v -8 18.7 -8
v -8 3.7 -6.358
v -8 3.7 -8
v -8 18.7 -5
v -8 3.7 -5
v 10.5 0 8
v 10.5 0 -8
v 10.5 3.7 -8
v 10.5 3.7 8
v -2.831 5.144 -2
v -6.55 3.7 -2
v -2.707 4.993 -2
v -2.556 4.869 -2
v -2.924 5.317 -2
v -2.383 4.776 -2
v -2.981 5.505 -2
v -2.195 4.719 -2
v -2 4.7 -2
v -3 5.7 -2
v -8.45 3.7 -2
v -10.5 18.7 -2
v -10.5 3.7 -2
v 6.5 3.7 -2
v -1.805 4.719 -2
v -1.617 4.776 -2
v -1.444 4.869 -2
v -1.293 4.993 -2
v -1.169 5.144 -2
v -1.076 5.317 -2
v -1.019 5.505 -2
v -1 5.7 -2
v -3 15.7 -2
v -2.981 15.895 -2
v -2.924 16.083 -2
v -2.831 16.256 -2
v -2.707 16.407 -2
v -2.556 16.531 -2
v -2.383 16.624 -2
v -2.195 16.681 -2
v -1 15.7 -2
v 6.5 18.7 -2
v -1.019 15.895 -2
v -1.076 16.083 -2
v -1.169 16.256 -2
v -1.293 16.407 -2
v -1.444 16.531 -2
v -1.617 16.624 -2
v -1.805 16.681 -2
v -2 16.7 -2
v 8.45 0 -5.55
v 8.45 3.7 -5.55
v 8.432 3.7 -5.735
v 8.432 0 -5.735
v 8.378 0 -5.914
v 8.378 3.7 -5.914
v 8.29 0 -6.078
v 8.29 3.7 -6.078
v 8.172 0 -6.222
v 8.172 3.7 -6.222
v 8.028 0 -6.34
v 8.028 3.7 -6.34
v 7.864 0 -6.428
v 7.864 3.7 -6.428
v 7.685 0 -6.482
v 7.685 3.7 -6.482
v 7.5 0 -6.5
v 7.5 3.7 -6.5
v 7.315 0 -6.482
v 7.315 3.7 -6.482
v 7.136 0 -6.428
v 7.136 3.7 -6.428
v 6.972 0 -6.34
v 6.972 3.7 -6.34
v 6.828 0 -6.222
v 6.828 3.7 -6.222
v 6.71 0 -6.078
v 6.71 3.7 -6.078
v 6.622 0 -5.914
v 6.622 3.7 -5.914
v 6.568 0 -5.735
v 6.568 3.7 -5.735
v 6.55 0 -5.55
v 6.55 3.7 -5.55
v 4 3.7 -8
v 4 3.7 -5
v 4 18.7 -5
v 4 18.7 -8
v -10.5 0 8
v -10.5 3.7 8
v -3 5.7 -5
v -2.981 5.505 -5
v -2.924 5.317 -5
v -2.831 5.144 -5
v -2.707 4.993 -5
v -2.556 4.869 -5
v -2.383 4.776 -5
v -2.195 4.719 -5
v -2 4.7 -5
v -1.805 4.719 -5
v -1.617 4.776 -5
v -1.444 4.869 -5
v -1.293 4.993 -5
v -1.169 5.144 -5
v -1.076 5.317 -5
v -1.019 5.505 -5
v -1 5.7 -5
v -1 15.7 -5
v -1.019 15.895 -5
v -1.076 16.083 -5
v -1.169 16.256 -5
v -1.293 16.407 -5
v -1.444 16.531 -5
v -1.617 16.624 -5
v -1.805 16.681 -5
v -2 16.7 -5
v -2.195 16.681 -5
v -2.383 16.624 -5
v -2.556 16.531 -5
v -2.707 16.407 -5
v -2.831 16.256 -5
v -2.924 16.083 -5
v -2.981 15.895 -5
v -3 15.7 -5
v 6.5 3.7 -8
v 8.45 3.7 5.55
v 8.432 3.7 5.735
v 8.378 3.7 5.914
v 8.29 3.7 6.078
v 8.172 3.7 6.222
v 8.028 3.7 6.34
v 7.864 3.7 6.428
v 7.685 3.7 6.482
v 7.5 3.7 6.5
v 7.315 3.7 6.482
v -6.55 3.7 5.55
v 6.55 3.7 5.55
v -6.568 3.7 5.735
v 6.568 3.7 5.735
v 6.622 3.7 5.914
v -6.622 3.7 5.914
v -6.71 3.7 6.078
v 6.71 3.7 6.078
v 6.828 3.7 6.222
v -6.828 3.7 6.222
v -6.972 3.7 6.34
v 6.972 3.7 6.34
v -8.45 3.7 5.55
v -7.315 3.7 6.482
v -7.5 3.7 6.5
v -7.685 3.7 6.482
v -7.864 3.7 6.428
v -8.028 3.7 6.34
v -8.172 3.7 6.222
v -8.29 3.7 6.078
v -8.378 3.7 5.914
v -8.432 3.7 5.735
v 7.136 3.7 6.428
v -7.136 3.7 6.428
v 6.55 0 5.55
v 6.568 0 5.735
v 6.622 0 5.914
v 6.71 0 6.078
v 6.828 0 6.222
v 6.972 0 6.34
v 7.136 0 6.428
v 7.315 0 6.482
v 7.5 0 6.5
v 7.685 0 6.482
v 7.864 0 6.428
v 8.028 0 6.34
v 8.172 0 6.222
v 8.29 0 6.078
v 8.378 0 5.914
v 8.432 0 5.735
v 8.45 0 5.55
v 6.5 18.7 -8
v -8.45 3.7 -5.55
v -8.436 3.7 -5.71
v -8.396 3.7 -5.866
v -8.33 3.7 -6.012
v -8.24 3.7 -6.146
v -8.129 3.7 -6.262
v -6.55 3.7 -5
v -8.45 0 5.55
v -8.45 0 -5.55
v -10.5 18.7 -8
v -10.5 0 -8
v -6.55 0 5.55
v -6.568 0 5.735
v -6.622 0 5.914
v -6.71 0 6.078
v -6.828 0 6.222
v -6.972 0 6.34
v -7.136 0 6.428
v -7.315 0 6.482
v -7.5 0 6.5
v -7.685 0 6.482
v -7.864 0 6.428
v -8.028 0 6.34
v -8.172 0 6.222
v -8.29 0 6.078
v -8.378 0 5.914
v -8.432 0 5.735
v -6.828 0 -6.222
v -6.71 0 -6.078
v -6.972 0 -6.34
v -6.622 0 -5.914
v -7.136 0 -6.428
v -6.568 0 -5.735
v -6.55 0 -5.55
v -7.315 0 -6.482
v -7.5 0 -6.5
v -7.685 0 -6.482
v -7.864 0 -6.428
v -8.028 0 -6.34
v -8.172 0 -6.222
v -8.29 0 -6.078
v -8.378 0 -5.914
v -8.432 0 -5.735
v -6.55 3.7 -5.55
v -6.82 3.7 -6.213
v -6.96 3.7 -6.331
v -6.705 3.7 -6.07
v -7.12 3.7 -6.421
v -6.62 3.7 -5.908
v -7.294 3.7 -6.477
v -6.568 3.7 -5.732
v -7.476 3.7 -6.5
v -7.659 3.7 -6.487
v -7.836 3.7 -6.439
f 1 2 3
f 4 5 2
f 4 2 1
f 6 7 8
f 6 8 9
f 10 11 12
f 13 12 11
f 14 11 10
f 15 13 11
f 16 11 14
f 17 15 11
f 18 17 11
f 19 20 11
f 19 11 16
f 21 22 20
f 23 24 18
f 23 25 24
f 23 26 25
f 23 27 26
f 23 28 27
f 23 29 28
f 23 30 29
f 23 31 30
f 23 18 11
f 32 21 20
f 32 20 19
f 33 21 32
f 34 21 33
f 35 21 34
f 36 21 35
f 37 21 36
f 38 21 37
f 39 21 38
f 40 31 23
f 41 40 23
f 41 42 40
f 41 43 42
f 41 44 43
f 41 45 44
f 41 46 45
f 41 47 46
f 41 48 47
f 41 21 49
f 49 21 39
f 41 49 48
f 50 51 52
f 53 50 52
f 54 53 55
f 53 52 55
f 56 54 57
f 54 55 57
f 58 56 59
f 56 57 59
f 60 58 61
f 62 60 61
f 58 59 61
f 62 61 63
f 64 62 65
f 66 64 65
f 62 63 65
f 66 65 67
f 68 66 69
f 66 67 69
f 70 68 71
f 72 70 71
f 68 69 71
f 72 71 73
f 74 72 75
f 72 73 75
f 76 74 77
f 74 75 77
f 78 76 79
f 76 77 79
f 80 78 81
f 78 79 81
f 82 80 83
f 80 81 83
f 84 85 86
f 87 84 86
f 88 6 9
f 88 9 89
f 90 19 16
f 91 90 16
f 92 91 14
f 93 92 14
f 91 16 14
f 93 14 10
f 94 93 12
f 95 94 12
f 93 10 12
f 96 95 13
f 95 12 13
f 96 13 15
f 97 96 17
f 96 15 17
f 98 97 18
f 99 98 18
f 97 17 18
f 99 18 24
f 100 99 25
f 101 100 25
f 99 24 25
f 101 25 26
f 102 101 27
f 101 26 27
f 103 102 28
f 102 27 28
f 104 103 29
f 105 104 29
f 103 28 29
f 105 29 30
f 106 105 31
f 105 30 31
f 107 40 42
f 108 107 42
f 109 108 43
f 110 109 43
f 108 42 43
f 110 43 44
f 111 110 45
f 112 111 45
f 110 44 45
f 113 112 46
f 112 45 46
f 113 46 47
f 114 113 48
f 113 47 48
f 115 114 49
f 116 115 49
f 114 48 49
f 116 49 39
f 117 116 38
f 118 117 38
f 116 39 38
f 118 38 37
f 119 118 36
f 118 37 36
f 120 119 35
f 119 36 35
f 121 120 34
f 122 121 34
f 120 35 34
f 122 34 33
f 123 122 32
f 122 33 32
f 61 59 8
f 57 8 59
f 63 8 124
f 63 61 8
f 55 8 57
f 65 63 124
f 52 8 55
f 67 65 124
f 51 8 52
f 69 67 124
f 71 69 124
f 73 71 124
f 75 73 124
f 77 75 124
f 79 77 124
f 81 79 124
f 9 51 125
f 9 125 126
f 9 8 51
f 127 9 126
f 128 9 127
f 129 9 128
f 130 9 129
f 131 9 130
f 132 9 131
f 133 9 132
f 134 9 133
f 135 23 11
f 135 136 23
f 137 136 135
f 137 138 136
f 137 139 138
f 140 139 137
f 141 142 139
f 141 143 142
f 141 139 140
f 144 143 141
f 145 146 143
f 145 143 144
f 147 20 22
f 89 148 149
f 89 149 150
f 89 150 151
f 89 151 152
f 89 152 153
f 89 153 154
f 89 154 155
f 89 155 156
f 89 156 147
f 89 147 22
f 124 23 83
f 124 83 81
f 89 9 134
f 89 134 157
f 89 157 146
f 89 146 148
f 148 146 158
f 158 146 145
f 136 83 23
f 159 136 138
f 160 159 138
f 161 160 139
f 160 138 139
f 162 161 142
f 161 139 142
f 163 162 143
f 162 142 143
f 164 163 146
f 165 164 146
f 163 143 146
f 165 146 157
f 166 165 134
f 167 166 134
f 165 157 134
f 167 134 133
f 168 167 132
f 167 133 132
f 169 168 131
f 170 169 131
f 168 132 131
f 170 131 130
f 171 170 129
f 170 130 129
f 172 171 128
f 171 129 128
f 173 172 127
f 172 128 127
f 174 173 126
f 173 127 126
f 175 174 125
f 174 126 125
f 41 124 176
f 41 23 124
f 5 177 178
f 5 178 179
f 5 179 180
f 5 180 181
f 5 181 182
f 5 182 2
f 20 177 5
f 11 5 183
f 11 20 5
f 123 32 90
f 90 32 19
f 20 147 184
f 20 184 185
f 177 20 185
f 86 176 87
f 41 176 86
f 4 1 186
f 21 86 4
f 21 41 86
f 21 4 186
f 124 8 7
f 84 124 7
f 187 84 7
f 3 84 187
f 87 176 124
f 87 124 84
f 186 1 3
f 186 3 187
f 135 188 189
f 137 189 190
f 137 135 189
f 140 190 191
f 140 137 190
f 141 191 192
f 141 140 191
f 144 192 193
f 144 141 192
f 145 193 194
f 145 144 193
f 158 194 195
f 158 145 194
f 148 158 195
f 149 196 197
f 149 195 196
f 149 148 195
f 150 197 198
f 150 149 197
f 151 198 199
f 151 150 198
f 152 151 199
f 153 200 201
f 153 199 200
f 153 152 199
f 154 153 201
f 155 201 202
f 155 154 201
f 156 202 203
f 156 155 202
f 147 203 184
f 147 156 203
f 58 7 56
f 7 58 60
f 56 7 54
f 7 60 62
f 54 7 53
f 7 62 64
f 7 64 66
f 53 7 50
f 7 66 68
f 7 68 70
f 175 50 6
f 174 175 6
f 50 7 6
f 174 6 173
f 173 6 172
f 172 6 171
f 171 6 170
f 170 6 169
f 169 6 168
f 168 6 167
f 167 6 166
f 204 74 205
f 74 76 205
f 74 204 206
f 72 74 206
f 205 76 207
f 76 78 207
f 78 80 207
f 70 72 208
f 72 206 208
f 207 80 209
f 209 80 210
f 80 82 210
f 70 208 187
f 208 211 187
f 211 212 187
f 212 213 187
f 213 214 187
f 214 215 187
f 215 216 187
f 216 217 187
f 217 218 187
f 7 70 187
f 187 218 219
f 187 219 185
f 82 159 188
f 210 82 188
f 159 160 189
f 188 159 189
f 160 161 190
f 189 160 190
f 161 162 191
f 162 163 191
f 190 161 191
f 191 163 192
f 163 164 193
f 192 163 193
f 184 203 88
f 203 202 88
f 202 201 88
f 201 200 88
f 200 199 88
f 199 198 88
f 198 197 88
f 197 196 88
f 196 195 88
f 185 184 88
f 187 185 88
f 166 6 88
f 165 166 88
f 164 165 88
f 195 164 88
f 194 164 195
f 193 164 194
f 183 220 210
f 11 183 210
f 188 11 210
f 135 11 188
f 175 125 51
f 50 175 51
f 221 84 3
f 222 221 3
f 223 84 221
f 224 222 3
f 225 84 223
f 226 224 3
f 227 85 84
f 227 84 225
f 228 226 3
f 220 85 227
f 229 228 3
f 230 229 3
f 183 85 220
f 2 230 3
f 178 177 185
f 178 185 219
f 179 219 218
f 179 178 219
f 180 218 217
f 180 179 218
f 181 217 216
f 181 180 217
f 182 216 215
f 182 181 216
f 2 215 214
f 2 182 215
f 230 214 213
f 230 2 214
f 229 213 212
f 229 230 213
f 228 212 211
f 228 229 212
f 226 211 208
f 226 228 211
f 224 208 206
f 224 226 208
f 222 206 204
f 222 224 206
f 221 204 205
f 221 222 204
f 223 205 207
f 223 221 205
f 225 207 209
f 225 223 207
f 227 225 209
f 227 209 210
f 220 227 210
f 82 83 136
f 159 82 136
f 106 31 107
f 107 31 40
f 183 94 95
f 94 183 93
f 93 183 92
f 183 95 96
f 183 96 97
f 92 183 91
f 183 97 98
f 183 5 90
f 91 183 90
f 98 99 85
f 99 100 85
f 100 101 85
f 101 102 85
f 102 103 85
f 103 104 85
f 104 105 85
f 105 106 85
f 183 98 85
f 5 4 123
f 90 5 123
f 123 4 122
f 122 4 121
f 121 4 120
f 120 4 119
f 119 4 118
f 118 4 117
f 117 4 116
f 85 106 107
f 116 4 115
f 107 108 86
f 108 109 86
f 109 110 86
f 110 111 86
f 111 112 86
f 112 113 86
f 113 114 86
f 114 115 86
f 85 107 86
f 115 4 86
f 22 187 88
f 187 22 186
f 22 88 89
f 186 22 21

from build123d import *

# Parameters (mm, degrees)
SKETCH1_W           = 10
SKETCH1_H           = 16
BOSS_EXTRUDE1_DEPTH = 3.7
SKETCH5_W           = 5.5
SKETCH5_H           = 16
BOSS_EXTRUDE2_DEPTH = 3.7
CUT_EXTRUDE4_DEPTH  = 4.7
BOSS_EXTRUDE3_START = -2
SKETCH7_W           = 17
SKETCH7_H           = 15
BOSS_EXTRUDE3_DEPTH = 3
SKETCH8_W           = 2.5
SKETCH8_H           = 15
BOSS_EXTRUDE5_DEPTH = 3


with BuildPart() as part:
    # Sketch1 → Boss-Extrude1 (new body)
    with BuildSketch(Plane(origin=(0, 0, 0), x_dir=(1, 0, 0), z_dir=(0, 1, 0))):
        Rectangle(SKETCH1_W, SKETCH1_H)
    extrude(amount=BOSS_EXTRUDE1_DEPTH)

    # Sketch5 → Boss-Extrude2 (add)
    with BuildSketch(Plane.XZ):
        with Locations((-7.75, 0)):
            Rectangle(SKETCH5_W, SKETCH5_H)
    boss_extrude2 = extrude(amount=-BOSS_EXTRUDE2_DEPTH)

    # Sketch6 → Cut-Extrude4 (cut, through all)
    with BuildSketch(Plane(origin=(0, 3.7, 0), x_dir=(1, 0, 0), z_dir=(0, 1, 0))):
        with BuildLine():
            Line((-6.55, 5.55), (-6.55, -5.55))
            ThreePointArc((-6.55, -5.55), (-7.5, -6.5), (-8.45, -5.55))
            Line((-8.45, -5.55), (-8.45, 5.55))
            ThreePointArc((-8.45, 5.55), (-7.5, 6.5), (-6.55, 5.55))
        make_face()
    cut_extrude4 = extrude(amount=-CUT_EXTRUDE4_DEPTH, mode=Mode.SUBTRACT)

    # Mirror1: Boss-Extrude2, Cut-Extrude4 across plane
    add(boss_extrude2.mirror(Plane(origin=(0, 0, 0), x_dir=(0, 0, 1), z_dir=(1, 0, 0))))
    add(cut_extrude4.mirror(Plane(origin=(0, 0, 0), x_dir=(0, 0, 1), z_dir=(1, 0, 0))), mode=Mode.SUBTRACT)



with BuildPart() as body_2:
    # Sketch7 → Boss-Extrude3 (new body)
    with BuildSketch(Plane.XY.offset(BOSS_EXTRUDE3_START)):
        with Locations((-2, 11.2)):
            Rectangle(SKETCH7_W, SKETCH7_H)
        with BuildLine():
            Line((-3, 15.7), (-3, 5.7))
            ThreePointArc((-3, 5.7), (-2, 4.7), (-1, 5.7))
            Line((-1, 5.7), (-1, 15.7))
            ThreePointArc((-1, 15.7), (-2, 16.7), (-3, 15.7))
        make_face(mode=Mode.SUBTRACT)
    extrude(amount=-BOSS_EXTRUDE3_DEPTH)


with BuildPart() as part_1:
    add(part.part)

    add(body_2.part)  # Boss-Extrude5 merges body 2
    # Sketch8 → Boss-Extrude5 (add)
    with BuildSketch(Plane(origin=(0, 0, -5), x_dir=(-1, 0, 0), z_dir=(0, 0, -1))):
        with Locations((-5.25, 11.2)):
            Rectangle(SKETCH8_W, SKETCH8_H)
        with Locations((9.25, 11.2)):
            Rectangle(SKETCH8_W, SKETCH8_H)
    extrude(amount=BOSS_EXTRUDE5_DEPTH)


solid = part_1.part
